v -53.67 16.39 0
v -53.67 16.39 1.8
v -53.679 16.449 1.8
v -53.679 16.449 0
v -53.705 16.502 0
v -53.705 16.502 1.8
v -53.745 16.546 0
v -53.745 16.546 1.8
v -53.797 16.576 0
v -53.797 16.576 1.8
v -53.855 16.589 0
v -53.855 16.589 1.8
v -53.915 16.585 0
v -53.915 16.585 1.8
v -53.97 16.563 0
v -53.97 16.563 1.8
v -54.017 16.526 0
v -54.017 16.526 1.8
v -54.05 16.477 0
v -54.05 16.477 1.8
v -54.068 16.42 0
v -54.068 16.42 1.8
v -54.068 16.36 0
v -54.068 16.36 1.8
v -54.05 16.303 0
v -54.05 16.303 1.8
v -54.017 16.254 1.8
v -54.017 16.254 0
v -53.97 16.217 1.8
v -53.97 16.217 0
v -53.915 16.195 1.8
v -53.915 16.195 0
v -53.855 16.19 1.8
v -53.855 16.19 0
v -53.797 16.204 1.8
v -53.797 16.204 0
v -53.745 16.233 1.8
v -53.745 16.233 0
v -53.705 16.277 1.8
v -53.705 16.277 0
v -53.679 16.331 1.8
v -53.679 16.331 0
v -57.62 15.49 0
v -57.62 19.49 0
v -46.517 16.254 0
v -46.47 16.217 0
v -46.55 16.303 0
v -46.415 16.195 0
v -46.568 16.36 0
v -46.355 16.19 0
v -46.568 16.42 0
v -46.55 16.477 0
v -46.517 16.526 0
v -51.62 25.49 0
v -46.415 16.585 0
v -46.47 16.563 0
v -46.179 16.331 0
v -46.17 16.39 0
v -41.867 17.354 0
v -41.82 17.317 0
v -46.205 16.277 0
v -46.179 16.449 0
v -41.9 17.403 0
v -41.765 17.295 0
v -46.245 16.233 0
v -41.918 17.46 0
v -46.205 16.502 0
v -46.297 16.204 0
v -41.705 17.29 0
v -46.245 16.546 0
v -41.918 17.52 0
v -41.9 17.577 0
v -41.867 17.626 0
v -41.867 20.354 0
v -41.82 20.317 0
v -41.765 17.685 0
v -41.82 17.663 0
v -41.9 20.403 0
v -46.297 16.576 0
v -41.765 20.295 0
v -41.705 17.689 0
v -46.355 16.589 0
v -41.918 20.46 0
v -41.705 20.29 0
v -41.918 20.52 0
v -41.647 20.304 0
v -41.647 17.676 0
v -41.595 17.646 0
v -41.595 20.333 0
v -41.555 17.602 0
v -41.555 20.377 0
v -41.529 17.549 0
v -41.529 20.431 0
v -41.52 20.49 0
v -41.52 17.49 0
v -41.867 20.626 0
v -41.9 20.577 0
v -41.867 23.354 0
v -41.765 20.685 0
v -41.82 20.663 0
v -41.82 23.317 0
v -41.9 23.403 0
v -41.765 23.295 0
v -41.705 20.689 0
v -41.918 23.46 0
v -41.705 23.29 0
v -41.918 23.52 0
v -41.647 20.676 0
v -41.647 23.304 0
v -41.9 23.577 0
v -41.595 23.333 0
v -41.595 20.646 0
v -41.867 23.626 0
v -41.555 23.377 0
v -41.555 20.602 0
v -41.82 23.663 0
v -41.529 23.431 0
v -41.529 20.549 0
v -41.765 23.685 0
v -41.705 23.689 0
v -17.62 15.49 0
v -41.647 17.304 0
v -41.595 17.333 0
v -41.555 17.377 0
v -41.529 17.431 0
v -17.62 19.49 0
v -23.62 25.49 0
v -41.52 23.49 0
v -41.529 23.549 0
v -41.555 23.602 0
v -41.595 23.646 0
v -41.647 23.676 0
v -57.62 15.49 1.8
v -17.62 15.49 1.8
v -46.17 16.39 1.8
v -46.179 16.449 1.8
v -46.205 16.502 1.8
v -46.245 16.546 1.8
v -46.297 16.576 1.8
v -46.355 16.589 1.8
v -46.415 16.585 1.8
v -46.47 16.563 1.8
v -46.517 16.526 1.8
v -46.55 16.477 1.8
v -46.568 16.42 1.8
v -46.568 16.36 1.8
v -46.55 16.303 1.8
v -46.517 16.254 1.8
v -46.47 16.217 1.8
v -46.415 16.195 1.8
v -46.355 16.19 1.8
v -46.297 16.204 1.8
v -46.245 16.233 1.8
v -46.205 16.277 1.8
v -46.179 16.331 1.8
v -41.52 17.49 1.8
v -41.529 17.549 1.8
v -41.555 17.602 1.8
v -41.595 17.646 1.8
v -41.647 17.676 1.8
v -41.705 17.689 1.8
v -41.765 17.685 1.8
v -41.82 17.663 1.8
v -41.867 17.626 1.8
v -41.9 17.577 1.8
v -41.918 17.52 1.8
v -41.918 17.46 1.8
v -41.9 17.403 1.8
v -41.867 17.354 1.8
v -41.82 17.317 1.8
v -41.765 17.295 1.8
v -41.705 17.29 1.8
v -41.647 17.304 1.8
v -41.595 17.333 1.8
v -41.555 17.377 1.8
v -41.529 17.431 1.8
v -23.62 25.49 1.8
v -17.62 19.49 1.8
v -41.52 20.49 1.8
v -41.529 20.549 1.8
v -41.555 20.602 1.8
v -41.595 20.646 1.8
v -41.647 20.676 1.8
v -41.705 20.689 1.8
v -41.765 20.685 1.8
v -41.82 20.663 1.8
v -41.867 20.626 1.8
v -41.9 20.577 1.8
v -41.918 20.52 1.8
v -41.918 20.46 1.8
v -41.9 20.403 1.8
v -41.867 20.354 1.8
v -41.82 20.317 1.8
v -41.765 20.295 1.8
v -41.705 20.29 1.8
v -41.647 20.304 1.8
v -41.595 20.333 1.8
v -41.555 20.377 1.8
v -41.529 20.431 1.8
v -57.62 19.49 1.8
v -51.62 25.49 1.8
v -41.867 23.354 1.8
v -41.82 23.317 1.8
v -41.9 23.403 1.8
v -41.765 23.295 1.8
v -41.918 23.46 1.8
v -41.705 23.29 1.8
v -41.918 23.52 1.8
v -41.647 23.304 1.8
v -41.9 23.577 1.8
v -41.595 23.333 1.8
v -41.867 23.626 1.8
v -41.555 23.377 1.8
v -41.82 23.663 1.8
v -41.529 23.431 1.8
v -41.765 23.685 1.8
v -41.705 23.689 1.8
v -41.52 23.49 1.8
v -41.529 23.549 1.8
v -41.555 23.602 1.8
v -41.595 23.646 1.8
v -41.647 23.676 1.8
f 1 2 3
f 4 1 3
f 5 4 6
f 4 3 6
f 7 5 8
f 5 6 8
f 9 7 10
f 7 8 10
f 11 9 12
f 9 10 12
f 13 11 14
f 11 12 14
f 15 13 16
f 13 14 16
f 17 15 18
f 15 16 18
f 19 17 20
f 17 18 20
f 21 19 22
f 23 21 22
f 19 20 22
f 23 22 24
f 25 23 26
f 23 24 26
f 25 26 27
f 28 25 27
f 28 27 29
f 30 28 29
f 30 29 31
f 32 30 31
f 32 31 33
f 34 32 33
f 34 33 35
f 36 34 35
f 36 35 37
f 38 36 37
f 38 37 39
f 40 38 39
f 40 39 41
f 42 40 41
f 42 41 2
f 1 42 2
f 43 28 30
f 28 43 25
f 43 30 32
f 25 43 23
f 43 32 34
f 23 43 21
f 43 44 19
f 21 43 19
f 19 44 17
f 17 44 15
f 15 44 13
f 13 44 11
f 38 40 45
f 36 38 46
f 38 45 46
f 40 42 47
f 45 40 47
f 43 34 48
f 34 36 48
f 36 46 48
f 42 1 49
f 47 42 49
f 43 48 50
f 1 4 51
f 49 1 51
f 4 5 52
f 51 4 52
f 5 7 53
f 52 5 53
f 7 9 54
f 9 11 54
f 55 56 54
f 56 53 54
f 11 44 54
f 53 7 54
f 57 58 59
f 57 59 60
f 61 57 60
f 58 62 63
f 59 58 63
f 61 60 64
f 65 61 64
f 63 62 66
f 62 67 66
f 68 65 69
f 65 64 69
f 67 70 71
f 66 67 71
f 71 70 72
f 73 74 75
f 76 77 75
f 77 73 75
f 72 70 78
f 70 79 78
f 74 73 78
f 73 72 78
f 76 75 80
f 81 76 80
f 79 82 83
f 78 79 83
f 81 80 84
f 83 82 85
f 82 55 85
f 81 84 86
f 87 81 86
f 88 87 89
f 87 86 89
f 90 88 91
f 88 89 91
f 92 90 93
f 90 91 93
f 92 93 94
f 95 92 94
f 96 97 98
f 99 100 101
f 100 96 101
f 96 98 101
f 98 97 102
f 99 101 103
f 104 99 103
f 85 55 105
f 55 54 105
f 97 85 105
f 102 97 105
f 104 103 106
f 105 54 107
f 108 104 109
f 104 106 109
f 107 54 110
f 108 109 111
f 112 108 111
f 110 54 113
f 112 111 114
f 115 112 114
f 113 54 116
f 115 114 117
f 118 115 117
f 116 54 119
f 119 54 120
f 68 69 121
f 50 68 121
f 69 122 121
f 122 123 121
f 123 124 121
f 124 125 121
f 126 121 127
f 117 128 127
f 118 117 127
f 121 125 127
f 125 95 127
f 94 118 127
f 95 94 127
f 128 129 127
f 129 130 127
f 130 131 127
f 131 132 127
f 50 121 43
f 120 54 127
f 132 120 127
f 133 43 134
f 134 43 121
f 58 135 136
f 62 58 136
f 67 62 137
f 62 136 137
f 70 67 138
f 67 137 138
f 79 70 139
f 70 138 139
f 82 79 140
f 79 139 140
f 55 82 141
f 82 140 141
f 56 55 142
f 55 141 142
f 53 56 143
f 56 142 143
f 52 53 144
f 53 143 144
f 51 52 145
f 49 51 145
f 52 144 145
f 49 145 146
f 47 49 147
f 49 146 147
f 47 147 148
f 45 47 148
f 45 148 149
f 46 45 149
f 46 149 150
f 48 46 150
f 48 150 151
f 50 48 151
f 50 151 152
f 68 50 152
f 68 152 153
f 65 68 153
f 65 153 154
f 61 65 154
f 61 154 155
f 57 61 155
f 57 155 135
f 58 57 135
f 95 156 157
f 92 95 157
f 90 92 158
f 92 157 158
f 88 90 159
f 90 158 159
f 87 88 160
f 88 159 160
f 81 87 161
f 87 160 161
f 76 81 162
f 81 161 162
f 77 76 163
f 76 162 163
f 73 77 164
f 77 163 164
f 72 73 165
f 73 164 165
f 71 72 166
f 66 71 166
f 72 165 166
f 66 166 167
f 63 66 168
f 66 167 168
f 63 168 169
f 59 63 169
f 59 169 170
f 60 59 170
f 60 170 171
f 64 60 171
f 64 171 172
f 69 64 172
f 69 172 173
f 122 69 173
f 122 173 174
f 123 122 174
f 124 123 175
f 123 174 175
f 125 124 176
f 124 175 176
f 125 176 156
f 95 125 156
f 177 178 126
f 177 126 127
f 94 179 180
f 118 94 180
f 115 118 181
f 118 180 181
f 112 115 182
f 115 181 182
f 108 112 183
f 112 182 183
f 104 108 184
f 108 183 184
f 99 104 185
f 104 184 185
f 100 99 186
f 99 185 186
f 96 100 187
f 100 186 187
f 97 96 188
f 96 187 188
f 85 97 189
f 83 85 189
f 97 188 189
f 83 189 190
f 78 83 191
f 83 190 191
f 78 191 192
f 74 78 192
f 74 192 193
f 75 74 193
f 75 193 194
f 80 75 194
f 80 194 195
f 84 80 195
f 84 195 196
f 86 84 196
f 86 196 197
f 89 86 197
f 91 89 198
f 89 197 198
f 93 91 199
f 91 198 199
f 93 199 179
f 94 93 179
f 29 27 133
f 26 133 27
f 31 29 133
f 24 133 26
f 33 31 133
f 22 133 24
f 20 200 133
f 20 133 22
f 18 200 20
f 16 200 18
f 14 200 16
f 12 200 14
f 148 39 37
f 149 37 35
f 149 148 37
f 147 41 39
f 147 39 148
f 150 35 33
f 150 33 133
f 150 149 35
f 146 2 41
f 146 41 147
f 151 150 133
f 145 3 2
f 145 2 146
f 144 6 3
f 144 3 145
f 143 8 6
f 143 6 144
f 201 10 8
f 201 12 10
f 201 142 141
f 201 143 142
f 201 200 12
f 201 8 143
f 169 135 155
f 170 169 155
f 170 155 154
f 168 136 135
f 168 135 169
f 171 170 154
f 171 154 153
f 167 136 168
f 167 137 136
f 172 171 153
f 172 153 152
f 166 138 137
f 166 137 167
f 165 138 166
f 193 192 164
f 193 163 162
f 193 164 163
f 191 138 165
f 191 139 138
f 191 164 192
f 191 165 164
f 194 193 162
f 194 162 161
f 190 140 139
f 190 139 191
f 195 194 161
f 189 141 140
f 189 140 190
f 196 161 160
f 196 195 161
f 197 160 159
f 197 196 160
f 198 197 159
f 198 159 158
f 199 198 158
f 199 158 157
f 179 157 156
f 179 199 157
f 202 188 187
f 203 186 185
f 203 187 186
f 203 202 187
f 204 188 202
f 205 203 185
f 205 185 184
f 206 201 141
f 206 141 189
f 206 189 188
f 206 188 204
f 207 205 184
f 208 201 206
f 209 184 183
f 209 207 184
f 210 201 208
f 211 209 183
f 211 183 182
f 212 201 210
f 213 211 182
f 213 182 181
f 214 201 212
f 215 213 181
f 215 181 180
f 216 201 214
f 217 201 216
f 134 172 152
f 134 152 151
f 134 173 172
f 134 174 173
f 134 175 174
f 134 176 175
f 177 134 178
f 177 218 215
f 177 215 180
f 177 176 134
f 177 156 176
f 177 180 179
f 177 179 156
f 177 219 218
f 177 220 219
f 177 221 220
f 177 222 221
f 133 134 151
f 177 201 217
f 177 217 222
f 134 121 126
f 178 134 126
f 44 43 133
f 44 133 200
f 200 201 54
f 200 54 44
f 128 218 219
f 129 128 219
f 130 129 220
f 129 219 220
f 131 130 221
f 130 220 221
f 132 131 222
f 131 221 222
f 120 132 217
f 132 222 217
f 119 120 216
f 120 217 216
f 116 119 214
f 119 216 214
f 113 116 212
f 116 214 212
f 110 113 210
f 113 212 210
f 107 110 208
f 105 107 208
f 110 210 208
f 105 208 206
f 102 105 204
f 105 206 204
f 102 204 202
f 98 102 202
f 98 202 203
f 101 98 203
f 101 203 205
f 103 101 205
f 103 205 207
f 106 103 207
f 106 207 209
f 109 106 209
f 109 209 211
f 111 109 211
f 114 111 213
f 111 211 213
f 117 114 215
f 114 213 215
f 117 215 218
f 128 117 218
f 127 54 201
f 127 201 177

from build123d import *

# Parameters (mm, degrees)
ESBO_O1_W                = 40
ESBO_O1_H                = 10
RESSALTO_EXTRUS_O1_DEPTH = 1.8
CORTE_EXTRUS_O1_DEPTH    = 1.8
ESBO_O4_R                = 0.2
CORTE_EXTRUS_O2_DEPTH    = 1.8
ESBO_O5_R                = 0.2
CORTE_EXTRUS_O3_DEPTH    = 64.032052928


with BuildPart() as part:
    # Esboço1 → Ressalto-extrusão1 (new body)
    with BuildSketch(Plane.XY):
        with Locations((-37.620035336, 20.489825898)):
            Rectangle(ESBO_O1_W, ESBO_O1_H)
    extrude(amount=RESSALTO_EXTRUS_O1_DEPTH)

    # Esboço3 → Corte-extrusão1 (cut)
    with BuildSketch(Plane.XY.offset(1.8)):
        Polygon((-51.620035336, 25.489825898), (-57.620035336, 19.489825898), (-57.620035336, 25.489825898), align=None)
        Polygon((-17.620035336, 19.489825898), (-23.620035336, 25.489825898), (-17.620035336, 25.489825898), align=None)
    extrude(amount=-CORTE_EXTRUS_O1_DEPTH, mode=Mode.SUBTRACT)

    # Esboço4 → Corte-extrusão2 (cut)
    with BuildSketch(Plane.XY.offset(1.8)):
        with Locations((-41.720035336, 17.489825898)):
            Circle(ESBO_O4_R)
        with Locations((-41.720035336, 20.489825898)):
            Circle(ESBO_O4_R)
        with Locations((-41.720035336, 23.489825898)):
            Circle(ESBO_O4_R)
    extrude(amount=-CORTE_EXTRUS_O2_DEPTH, mode=Mode.SUBTRACT)

    # Esboço5 → Corte-extrusão3 (cut, through all)
    with BuildSketch(Plane.XY.offset(1.8)):
        with Locations((-53.870035336, 16.389825898)):
            Circle(ESBO_O5_R)
        with Locations((-46.370035336, 16.389825898)):
            Circle(ESBO_O5_R)
    extrude(amount=-CORTE_EXTRUS_O3_DEPTH, mode=Mode.SUBTRACT)


solid = part.part
